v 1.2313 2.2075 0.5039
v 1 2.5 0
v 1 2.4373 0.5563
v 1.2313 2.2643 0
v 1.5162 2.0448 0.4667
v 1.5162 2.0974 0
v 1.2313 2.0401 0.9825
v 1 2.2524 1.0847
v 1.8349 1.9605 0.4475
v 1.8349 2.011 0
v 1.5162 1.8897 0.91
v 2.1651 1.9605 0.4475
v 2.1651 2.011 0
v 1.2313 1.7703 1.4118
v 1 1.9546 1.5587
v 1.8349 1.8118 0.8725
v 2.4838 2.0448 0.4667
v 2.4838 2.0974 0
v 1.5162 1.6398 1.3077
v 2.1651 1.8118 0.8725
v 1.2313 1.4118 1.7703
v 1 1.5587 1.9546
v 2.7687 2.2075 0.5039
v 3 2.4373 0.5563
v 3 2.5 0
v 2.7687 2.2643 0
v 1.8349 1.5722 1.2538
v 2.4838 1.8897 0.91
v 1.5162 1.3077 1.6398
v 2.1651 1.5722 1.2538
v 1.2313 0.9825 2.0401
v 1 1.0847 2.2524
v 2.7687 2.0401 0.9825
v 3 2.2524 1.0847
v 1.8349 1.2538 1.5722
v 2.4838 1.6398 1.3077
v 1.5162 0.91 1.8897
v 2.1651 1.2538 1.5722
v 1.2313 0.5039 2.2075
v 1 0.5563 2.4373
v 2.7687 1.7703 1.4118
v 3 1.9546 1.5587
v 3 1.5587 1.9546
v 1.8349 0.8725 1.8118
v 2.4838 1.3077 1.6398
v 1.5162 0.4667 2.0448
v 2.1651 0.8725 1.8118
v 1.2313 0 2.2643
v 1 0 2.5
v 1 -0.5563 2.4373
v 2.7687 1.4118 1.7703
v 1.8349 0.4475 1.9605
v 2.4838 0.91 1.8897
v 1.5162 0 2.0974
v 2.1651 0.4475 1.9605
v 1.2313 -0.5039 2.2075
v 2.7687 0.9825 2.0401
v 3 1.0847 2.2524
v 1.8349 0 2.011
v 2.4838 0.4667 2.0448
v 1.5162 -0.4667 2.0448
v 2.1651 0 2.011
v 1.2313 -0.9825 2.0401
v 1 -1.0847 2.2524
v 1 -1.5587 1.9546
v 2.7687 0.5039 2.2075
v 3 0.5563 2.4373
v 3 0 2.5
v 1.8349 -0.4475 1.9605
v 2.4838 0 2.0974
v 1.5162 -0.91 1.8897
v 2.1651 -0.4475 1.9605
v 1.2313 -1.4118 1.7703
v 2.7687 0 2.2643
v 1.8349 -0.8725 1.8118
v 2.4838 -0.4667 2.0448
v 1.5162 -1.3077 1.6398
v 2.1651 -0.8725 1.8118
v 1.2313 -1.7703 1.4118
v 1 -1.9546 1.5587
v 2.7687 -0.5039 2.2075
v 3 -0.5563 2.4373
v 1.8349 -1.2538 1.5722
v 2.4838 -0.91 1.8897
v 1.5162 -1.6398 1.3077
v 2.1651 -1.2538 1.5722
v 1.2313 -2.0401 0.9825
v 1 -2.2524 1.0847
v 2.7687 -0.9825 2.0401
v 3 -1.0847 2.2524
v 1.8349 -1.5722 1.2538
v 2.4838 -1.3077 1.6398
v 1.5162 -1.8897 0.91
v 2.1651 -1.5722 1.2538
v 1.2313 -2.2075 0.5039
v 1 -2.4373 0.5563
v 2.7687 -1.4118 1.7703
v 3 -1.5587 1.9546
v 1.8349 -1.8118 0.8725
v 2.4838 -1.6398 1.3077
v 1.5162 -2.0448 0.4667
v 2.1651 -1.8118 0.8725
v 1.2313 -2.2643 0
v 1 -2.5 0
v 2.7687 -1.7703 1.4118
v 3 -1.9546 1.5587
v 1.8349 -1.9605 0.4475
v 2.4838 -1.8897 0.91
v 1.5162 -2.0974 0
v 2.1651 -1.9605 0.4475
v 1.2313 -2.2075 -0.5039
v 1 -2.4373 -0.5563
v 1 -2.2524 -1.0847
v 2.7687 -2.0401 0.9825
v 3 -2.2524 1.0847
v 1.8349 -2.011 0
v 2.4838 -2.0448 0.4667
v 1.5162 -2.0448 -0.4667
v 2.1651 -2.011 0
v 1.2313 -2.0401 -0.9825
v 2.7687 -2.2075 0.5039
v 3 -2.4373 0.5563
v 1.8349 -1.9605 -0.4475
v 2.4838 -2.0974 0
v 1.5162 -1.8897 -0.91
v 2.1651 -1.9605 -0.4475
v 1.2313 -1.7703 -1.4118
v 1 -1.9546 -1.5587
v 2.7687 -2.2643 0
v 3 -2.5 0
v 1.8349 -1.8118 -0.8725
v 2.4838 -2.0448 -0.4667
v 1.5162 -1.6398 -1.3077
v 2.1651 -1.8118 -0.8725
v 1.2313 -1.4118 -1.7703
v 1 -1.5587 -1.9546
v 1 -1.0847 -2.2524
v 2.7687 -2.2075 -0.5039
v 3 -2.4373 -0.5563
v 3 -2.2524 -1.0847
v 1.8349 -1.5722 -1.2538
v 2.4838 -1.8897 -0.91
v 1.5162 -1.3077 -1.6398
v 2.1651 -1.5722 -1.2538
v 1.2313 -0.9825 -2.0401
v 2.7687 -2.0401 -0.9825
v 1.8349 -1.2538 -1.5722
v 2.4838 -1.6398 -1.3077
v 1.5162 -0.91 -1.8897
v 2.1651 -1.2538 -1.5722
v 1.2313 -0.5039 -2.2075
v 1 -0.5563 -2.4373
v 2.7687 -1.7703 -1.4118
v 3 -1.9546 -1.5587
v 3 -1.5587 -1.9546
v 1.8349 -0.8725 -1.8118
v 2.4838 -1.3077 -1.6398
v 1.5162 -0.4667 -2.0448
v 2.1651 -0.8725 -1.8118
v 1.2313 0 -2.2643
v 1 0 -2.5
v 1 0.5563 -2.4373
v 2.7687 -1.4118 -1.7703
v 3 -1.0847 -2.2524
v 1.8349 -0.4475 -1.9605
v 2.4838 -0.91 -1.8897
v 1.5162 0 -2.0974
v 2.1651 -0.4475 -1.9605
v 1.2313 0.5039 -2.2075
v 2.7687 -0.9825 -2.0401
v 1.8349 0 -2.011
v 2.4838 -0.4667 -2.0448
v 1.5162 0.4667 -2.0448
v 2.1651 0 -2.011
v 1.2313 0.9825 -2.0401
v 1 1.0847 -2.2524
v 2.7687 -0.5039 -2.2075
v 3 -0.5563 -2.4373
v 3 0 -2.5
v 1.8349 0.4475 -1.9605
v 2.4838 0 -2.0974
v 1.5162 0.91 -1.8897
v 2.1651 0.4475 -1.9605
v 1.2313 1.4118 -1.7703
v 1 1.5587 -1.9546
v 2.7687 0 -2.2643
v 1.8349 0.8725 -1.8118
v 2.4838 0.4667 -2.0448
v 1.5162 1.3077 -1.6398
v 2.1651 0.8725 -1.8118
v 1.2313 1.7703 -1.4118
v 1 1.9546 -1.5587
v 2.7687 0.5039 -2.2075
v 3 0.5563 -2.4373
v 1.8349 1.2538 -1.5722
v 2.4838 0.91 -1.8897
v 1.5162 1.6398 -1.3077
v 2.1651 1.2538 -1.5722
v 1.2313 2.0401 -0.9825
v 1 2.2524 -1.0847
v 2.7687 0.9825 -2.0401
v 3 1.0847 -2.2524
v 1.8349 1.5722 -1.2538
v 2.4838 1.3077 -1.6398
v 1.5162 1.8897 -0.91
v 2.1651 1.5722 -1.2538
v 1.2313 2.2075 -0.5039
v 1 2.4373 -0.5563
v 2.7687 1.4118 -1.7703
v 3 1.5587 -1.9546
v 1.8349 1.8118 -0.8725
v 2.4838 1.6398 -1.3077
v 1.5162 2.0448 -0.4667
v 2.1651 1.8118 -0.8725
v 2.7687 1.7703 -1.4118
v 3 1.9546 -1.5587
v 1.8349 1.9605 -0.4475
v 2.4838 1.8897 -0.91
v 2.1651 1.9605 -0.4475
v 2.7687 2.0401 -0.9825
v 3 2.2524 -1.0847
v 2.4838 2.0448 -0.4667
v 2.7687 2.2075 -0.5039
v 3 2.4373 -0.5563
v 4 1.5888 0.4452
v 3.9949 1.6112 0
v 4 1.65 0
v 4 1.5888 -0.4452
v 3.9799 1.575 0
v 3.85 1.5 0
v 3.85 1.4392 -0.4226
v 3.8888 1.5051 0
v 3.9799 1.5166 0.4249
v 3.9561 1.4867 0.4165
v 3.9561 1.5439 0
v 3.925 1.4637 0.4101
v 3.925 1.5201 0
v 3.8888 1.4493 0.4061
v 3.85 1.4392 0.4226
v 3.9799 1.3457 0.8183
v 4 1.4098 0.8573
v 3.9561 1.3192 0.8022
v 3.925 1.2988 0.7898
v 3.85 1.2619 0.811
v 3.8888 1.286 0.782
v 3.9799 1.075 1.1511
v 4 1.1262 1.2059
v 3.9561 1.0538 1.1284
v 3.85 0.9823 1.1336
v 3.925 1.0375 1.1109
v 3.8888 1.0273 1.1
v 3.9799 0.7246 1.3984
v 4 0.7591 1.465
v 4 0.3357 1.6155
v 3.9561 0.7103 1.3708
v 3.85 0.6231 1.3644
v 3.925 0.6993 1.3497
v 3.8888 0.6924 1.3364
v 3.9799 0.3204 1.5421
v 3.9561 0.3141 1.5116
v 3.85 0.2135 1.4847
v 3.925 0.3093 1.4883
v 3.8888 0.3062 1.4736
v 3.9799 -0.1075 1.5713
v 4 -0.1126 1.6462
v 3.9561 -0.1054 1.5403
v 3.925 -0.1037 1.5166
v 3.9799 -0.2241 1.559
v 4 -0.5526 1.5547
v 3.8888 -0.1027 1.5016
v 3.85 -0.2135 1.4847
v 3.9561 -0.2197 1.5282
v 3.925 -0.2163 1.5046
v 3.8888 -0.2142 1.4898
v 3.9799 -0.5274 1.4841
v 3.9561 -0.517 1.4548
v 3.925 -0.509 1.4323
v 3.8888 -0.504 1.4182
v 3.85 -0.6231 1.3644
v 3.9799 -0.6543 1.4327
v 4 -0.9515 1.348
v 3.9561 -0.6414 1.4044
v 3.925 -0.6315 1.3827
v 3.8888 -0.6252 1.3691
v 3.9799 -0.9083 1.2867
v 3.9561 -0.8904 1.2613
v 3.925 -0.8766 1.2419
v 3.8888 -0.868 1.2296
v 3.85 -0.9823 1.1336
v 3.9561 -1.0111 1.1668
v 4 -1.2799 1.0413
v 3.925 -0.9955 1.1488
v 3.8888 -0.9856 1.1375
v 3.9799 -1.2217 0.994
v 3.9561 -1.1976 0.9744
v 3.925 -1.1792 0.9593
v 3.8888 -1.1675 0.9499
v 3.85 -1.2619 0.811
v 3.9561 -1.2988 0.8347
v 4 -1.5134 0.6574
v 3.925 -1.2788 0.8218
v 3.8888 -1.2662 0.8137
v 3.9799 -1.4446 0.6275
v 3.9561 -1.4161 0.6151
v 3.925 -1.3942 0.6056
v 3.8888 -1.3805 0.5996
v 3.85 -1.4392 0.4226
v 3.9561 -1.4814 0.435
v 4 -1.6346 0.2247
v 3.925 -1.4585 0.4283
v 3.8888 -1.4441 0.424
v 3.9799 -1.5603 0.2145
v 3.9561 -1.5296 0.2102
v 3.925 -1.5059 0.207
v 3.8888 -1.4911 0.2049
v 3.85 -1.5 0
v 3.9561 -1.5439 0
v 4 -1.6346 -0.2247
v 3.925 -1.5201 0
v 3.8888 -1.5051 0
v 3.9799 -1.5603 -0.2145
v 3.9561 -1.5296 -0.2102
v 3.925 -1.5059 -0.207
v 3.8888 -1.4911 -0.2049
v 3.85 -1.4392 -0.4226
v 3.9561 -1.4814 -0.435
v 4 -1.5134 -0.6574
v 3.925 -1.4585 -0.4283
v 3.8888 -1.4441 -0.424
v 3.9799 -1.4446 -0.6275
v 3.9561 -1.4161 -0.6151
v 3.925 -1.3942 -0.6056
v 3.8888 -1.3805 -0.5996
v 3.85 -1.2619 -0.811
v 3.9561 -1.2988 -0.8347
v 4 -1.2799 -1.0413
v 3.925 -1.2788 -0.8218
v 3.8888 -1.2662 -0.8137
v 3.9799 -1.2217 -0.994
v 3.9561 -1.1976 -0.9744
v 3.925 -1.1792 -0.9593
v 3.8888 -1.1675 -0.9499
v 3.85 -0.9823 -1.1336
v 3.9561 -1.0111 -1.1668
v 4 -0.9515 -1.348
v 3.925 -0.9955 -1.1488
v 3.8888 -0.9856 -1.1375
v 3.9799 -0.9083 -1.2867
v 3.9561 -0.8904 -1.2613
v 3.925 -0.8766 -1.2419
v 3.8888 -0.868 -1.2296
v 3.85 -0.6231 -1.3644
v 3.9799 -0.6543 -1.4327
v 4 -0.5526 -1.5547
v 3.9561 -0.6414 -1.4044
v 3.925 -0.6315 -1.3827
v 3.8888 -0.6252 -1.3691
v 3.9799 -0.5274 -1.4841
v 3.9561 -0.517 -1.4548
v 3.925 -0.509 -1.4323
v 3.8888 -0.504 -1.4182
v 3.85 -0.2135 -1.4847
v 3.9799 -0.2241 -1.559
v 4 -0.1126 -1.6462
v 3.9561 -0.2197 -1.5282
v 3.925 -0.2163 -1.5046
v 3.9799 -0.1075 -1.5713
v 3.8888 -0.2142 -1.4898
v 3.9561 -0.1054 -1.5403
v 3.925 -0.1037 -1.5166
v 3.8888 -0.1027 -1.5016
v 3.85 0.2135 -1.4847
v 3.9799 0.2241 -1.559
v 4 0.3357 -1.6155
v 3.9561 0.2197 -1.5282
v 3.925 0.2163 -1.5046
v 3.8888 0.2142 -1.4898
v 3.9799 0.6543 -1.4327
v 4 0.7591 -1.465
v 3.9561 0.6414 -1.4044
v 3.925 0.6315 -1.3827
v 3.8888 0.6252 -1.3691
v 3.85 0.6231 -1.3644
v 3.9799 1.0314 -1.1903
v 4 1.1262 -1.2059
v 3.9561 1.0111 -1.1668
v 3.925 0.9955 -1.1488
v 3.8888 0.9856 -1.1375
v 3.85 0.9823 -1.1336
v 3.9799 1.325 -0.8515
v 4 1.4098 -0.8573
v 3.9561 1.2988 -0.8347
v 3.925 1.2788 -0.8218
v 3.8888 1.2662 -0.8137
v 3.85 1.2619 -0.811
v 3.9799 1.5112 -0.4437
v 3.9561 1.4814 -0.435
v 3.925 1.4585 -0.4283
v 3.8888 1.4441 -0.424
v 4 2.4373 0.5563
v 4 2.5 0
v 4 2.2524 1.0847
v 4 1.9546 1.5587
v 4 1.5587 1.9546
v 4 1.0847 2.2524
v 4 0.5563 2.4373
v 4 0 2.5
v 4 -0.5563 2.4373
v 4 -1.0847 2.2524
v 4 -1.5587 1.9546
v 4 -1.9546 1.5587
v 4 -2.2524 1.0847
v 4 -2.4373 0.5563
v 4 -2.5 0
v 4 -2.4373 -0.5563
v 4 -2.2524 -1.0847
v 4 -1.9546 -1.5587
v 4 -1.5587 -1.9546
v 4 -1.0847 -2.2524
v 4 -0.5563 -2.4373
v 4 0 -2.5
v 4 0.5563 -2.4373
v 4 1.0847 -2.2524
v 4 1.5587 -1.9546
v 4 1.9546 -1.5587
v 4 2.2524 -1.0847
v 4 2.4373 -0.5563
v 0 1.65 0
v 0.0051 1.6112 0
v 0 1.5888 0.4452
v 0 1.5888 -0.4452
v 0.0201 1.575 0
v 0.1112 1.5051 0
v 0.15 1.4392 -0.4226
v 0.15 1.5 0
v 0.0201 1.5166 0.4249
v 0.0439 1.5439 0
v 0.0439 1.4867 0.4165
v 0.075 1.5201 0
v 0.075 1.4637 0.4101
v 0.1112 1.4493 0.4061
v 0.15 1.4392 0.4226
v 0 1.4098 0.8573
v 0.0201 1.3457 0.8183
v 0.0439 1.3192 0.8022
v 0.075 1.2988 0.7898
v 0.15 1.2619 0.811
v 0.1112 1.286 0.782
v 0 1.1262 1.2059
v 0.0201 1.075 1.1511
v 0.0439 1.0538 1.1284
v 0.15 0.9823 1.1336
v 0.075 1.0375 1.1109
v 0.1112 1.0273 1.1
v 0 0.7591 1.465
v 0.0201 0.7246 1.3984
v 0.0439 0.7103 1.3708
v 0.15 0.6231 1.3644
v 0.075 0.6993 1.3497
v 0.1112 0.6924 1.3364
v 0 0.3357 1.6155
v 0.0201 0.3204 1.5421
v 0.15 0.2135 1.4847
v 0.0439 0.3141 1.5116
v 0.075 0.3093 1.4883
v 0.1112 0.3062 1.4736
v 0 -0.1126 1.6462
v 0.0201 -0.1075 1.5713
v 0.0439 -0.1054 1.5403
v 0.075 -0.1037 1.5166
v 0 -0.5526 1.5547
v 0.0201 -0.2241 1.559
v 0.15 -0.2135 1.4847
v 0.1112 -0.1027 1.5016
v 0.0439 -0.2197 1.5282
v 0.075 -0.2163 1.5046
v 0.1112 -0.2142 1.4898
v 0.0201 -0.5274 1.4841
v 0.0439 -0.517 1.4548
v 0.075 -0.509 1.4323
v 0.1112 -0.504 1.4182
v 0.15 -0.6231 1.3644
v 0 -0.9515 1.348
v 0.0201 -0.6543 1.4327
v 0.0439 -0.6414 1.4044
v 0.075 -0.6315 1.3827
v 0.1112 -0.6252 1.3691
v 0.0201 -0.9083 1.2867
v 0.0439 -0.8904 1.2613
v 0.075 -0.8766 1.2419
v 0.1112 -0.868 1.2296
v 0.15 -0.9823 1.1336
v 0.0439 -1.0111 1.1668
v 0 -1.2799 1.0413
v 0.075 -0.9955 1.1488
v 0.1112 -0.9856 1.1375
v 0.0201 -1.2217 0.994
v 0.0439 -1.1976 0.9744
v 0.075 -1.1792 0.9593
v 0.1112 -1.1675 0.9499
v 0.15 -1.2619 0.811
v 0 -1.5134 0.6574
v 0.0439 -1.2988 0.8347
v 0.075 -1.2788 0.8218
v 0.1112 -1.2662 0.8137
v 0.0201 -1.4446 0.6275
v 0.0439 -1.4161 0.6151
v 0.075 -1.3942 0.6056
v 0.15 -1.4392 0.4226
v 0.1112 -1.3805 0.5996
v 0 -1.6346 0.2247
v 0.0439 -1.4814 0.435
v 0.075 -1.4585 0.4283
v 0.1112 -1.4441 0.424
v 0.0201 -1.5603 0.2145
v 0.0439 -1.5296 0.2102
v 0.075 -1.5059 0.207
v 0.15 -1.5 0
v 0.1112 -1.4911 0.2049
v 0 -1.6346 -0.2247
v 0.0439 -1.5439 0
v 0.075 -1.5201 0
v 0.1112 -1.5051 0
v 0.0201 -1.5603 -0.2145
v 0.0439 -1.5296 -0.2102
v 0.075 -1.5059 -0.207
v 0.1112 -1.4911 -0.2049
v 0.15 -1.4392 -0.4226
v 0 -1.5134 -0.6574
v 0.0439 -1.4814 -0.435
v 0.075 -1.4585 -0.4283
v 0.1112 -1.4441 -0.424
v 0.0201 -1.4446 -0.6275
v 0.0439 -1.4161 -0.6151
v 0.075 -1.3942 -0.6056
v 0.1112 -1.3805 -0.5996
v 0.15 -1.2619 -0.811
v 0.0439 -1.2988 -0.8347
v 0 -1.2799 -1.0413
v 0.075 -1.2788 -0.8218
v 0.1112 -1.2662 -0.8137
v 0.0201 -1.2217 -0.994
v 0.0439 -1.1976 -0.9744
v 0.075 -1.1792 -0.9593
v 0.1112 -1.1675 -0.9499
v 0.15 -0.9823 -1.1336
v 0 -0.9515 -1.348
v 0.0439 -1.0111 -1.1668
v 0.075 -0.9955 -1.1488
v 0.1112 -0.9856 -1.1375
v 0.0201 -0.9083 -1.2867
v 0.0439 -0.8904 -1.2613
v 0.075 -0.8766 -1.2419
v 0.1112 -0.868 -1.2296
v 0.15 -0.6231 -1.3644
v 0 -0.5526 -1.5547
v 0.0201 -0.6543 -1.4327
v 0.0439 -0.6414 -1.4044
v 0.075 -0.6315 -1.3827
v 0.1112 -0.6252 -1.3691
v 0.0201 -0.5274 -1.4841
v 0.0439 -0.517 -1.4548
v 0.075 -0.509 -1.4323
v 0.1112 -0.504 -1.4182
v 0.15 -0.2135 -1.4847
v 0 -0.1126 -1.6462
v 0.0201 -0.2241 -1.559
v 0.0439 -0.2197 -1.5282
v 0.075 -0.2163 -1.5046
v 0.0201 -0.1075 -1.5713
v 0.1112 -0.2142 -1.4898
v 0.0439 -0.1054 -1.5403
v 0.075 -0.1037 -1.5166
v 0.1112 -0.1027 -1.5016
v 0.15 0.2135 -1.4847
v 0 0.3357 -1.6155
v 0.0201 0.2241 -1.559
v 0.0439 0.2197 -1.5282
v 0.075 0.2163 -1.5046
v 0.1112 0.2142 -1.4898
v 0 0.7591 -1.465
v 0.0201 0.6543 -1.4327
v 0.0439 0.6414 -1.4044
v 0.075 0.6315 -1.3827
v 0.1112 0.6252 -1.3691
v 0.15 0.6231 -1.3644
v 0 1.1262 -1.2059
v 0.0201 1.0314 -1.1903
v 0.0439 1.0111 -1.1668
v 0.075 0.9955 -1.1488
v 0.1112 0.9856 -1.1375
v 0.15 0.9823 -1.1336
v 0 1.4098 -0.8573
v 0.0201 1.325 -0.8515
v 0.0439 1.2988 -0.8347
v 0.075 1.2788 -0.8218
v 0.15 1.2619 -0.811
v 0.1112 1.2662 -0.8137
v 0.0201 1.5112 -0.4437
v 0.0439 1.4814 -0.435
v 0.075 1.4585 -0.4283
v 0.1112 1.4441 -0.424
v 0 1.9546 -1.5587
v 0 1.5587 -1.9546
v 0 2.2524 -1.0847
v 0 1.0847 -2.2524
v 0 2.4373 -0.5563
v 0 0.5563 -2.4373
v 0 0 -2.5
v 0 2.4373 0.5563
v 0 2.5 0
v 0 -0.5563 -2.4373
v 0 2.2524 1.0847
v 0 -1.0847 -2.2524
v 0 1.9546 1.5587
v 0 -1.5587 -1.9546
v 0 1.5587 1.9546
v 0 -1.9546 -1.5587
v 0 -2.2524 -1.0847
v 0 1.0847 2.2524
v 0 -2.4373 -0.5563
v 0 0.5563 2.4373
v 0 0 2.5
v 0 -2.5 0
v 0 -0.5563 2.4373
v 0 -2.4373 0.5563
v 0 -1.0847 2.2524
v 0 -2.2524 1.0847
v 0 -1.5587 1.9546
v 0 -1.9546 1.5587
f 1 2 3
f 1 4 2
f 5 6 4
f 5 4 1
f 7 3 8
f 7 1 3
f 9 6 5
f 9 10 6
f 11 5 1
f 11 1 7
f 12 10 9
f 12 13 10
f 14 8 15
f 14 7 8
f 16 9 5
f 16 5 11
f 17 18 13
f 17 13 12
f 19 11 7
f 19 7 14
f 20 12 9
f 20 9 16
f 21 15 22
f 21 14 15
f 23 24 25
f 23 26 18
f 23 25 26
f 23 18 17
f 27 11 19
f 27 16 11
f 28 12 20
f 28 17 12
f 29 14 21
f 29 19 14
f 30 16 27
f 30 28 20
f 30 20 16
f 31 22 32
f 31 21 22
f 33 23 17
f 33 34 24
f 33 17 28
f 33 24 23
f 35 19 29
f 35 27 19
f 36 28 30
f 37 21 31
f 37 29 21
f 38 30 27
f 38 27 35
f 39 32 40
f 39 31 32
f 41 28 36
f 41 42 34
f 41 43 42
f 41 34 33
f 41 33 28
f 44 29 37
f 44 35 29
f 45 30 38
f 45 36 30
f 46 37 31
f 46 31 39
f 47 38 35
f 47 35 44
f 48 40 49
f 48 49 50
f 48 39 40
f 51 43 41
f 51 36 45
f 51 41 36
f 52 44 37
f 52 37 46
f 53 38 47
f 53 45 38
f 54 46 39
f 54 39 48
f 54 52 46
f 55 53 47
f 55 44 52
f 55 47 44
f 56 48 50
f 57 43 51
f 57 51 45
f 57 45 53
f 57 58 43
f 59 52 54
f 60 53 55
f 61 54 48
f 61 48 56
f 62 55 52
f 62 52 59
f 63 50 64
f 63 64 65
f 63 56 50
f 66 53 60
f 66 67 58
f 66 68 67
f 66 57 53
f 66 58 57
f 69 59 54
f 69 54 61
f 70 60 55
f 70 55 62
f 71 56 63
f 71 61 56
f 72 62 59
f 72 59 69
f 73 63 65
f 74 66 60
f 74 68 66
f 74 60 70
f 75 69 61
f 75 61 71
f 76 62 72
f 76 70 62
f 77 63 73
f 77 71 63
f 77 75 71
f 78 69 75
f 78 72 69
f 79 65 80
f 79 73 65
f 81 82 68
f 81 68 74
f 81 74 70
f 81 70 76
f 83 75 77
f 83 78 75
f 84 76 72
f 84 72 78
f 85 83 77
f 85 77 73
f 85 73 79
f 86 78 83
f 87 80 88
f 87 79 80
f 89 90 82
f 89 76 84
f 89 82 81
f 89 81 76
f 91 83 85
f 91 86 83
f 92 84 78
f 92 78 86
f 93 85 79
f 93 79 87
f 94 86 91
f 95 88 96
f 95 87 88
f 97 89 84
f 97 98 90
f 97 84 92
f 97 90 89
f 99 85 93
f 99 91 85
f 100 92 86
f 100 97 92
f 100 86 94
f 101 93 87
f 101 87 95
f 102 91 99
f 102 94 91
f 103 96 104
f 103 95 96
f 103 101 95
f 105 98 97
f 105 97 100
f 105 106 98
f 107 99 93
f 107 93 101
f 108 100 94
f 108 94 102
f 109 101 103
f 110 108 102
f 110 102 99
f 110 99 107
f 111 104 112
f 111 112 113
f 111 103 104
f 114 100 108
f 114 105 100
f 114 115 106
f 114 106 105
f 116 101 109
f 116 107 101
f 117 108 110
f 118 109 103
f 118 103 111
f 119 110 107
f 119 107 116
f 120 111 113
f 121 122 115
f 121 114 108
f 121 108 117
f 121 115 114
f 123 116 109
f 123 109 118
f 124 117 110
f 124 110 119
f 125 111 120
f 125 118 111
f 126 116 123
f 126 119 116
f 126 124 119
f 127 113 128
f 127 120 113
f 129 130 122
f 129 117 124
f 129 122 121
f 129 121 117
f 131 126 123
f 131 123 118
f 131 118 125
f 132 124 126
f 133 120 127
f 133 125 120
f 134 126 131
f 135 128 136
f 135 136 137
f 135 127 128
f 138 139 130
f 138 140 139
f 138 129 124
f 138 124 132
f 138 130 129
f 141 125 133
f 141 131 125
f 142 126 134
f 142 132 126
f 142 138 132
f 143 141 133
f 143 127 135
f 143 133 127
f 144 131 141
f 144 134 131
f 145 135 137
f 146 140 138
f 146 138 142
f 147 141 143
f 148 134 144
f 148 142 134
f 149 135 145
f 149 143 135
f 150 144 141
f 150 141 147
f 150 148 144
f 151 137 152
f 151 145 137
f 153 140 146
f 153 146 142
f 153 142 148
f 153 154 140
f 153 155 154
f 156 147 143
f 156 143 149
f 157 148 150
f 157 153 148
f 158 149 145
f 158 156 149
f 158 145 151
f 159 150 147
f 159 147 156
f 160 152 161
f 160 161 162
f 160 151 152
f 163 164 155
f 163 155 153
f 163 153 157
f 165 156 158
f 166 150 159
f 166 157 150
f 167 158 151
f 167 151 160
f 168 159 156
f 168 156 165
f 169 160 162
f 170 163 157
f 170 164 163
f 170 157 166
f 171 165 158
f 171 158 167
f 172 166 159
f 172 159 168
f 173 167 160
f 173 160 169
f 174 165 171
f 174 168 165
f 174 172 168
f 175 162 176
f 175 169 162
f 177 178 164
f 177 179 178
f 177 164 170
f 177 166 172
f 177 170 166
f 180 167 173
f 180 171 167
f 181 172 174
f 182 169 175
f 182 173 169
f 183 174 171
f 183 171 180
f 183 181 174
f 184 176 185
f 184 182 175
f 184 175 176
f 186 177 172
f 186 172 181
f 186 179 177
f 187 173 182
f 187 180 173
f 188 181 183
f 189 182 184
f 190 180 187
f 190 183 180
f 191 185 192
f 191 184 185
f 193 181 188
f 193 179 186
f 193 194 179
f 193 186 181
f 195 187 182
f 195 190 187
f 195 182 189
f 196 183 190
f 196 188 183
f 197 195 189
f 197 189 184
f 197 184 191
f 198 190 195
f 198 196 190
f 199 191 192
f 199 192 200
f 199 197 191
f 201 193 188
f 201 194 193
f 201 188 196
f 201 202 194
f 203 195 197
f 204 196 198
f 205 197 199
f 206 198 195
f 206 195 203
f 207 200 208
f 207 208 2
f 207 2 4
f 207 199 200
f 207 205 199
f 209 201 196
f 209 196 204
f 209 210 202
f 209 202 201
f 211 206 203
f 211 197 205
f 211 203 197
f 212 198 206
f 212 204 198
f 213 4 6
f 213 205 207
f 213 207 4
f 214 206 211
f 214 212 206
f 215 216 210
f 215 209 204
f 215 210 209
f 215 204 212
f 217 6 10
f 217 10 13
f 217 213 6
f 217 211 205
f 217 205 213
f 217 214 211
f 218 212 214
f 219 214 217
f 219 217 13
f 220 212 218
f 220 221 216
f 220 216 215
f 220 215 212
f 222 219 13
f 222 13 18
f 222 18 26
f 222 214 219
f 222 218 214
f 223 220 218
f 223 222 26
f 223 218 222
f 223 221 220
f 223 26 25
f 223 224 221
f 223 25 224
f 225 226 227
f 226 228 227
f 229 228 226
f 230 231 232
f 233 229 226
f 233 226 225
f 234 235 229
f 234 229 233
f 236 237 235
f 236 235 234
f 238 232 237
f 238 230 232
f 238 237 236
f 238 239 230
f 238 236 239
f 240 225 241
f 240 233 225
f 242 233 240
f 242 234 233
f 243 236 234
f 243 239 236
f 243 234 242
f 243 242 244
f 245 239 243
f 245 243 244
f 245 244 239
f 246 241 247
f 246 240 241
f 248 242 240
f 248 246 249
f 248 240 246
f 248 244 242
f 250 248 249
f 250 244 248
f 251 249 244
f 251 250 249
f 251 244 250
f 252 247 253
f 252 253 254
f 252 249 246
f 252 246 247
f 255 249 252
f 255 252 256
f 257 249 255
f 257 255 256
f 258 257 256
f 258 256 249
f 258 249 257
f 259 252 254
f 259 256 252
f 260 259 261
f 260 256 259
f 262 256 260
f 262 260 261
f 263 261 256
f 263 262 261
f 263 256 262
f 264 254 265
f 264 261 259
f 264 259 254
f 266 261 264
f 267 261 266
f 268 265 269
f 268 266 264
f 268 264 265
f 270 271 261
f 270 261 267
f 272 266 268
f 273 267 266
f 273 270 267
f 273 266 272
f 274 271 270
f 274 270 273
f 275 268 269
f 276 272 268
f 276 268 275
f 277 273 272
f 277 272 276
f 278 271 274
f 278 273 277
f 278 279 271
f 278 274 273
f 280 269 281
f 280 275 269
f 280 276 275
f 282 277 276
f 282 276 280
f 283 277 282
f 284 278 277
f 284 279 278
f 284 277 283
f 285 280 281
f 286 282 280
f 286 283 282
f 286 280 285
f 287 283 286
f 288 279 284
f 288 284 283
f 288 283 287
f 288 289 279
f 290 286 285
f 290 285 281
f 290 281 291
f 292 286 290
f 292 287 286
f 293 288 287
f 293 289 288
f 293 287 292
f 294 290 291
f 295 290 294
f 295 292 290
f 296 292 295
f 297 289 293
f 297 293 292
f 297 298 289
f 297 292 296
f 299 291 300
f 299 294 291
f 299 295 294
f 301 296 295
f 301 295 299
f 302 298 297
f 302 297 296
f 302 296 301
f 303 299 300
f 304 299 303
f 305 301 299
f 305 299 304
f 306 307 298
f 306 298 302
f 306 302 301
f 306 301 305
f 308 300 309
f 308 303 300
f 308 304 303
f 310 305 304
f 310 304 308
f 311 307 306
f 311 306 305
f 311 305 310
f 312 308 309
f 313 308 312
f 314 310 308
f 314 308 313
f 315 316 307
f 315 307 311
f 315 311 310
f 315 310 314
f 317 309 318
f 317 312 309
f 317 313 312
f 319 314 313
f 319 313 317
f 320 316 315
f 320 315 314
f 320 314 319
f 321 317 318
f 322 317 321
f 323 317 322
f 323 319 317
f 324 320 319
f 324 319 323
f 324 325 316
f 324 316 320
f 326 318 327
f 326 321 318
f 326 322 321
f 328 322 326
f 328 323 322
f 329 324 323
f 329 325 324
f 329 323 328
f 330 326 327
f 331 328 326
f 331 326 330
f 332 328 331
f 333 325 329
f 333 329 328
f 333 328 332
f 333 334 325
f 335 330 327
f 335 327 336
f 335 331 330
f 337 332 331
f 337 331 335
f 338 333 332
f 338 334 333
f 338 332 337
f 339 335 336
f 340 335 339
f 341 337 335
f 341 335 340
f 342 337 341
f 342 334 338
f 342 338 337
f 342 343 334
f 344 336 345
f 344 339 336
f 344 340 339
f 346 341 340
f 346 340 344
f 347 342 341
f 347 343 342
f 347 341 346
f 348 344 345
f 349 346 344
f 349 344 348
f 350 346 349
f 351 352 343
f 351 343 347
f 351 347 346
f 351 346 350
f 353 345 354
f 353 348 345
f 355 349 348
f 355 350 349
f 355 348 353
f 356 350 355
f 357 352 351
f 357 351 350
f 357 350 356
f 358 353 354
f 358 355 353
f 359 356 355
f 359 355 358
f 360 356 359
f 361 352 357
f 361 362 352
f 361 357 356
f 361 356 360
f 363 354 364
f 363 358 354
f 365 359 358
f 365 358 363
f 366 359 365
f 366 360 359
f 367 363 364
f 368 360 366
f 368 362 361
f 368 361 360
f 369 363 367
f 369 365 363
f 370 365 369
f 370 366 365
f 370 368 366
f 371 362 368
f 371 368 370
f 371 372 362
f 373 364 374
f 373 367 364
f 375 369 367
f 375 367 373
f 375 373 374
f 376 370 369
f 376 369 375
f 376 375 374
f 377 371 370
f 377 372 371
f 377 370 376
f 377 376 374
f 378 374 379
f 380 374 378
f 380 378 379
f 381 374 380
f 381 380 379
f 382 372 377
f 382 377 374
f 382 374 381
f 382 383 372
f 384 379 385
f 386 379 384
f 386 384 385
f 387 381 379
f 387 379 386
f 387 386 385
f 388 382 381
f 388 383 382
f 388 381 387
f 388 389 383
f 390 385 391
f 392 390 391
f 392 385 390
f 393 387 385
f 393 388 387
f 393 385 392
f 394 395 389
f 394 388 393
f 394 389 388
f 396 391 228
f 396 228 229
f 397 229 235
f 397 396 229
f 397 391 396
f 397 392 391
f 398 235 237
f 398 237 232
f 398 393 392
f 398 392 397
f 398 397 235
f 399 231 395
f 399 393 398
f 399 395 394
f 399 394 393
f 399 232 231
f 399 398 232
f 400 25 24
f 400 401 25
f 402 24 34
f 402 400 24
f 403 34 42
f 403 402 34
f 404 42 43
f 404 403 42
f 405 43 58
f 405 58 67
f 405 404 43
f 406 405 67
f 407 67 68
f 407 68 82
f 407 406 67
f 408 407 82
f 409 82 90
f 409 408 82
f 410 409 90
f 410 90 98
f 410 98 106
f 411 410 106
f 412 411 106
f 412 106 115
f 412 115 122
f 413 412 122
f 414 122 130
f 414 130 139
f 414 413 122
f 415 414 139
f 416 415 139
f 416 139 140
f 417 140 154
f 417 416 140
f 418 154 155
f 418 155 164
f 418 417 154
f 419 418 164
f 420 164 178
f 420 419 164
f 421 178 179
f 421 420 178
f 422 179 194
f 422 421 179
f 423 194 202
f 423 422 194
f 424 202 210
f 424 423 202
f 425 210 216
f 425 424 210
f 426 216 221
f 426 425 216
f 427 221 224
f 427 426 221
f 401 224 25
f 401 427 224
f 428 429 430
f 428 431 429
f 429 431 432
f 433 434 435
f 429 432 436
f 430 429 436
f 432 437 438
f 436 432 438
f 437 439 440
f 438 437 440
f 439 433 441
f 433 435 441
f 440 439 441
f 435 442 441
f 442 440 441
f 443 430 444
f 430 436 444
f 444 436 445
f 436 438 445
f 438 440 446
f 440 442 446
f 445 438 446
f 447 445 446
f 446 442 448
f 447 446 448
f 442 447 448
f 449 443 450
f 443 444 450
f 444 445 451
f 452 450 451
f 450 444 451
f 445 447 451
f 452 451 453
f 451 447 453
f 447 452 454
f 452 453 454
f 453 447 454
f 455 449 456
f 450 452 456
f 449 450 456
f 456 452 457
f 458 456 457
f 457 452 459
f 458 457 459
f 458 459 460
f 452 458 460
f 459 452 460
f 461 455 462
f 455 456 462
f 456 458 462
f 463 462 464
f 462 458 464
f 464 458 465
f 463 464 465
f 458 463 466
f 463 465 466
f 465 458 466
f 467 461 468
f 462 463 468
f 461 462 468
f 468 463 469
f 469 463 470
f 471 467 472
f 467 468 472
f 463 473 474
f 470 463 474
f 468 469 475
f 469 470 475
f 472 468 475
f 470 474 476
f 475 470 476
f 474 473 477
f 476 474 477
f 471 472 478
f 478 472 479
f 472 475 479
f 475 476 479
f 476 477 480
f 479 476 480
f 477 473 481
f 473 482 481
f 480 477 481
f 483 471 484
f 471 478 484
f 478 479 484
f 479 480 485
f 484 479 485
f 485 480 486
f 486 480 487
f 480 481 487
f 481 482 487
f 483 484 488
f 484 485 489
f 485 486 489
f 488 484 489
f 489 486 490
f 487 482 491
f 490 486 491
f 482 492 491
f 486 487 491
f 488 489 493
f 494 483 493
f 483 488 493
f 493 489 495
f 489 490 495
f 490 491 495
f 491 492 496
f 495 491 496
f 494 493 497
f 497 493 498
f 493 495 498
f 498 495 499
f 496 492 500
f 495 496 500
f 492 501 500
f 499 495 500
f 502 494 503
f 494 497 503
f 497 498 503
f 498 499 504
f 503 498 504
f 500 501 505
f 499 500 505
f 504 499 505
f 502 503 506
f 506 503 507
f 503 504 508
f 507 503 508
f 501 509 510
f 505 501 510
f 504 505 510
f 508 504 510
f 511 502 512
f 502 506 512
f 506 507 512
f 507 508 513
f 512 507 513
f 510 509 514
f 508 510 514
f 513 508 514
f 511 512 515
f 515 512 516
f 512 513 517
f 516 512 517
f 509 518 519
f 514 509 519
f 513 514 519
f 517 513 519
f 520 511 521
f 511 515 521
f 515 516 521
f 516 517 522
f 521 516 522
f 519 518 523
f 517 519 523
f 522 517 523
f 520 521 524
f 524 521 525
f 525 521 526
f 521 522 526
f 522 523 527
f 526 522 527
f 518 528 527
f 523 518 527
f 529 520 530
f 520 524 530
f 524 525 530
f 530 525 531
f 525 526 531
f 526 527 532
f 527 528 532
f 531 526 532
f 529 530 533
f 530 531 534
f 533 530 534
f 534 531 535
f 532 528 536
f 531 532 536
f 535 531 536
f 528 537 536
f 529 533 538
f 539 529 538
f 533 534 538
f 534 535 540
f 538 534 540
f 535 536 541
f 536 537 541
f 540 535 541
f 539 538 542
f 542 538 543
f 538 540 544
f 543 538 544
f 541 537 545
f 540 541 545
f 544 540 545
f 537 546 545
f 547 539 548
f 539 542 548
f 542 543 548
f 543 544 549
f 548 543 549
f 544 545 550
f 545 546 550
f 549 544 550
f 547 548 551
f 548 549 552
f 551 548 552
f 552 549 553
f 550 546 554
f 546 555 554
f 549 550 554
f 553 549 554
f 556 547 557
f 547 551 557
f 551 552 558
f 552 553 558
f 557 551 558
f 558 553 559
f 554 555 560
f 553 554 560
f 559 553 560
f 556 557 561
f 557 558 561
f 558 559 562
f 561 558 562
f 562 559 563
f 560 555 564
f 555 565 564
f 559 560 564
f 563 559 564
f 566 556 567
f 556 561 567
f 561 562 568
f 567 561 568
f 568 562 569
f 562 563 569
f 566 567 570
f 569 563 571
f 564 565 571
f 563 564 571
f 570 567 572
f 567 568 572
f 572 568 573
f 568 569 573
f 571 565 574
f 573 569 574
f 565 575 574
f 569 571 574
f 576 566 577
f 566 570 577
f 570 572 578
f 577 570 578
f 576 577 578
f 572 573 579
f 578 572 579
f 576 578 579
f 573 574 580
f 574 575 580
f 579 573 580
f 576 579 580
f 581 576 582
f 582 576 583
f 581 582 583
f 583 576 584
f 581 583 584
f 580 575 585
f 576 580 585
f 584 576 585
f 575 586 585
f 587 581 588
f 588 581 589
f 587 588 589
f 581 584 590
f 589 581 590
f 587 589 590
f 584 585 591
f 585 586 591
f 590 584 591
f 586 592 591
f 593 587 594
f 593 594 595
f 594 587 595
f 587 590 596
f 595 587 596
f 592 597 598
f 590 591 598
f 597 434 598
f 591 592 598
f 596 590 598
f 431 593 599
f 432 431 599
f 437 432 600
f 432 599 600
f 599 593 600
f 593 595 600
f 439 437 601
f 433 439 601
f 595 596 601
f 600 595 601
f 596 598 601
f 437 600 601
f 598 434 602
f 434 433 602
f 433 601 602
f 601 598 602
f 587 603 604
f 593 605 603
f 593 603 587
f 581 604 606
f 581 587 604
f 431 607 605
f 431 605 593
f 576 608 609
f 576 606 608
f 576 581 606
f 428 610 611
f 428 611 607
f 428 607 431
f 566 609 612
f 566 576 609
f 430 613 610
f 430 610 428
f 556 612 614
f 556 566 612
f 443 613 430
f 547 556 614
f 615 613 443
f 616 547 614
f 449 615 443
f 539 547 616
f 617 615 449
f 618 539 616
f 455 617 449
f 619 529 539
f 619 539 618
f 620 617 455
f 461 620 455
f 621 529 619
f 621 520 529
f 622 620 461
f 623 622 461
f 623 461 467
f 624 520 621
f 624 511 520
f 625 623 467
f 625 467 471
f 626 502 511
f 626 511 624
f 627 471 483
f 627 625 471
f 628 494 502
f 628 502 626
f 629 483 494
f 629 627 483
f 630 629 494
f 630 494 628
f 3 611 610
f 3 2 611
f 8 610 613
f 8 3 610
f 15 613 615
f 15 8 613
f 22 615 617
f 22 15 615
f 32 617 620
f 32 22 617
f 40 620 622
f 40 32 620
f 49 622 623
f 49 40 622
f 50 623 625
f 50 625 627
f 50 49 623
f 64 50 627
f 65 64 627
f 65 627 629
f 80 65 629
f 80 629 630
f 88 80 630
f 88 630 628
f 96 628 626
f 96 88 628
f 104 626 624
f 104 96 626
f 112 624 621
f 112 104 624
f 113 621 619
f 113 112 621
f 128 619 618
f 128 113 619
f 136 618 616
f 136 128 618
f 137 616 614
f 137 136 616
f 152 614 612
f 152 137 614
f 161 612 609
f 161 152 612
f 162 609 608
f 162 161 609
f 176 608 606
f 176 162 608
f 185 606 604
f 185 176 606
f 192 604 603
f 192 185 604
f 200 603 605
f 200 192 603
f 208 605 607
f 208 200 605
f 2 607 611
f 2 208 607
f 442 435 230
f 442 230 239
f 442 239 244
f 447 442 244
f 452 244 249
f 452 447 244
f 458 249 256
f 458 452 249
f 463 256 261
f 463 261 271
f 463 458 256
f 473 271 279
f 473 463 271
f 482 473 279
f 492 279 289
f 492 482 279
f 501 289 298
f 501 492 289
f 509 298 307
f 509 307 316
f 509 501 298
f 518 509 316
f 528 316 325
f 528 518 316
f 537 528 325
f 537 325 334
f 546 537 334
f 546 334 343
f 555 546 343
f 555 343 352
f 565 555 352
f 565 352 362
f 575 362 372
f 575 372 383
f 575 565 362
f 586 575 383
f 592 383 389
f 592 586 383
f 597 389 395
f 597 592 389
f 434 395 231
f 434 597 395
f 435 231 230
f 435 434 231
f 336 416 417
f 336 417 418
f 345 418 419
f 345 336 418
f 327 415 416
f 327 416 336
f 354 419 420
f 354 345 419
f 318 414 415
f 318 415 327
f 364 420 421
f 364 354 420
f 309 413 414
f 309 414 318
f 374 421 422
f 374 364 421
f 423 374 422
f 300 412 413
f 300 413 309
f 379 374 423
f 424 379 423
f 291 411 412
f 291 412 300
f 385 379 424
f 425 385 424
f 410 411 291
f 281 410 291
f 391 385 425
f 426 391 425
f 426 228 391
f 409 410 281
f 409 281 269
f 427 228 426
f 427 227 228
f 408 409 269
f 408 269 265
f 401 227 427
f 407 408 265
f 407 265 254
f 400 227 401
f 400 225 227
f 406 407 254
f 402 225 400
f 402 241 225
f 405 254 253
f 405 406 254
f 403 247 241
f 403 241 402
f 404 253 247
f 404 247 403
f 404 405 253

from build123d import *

# Parameters (mm, degrees)
CONG_1_R = 0.15


with BuildPart() as part:
    # Esquisse1 → Base-Révolution (revolve)
    with BuildSketch(Plane.XY):
        with BuildLine():
            Line((0, 1.5), (0, 2.5))
            Line((0, 2.5), (1, 2.5))
            ThreePointArc((1, 2.5), (2, 2), (3, 2.5))
            Line((3, 2.5), (4, 2.5))
            Line((4, 2.5), (4, 1.5))
            Line((4, 1.5), (0, 1.5))
        make_face()
    revolve(axis=Axis((0, 0, 0), (1, 0, 0)))

    # Congé1
    cong_1_edges = [part.edges().sort_by_distance(p)[0] for p in [
        (0, -1.5, 0),
        (4, -1.5, 0),
    ]]
    fillet(cong_1_edges, radius=CONG_1_R)


solid = part.part
